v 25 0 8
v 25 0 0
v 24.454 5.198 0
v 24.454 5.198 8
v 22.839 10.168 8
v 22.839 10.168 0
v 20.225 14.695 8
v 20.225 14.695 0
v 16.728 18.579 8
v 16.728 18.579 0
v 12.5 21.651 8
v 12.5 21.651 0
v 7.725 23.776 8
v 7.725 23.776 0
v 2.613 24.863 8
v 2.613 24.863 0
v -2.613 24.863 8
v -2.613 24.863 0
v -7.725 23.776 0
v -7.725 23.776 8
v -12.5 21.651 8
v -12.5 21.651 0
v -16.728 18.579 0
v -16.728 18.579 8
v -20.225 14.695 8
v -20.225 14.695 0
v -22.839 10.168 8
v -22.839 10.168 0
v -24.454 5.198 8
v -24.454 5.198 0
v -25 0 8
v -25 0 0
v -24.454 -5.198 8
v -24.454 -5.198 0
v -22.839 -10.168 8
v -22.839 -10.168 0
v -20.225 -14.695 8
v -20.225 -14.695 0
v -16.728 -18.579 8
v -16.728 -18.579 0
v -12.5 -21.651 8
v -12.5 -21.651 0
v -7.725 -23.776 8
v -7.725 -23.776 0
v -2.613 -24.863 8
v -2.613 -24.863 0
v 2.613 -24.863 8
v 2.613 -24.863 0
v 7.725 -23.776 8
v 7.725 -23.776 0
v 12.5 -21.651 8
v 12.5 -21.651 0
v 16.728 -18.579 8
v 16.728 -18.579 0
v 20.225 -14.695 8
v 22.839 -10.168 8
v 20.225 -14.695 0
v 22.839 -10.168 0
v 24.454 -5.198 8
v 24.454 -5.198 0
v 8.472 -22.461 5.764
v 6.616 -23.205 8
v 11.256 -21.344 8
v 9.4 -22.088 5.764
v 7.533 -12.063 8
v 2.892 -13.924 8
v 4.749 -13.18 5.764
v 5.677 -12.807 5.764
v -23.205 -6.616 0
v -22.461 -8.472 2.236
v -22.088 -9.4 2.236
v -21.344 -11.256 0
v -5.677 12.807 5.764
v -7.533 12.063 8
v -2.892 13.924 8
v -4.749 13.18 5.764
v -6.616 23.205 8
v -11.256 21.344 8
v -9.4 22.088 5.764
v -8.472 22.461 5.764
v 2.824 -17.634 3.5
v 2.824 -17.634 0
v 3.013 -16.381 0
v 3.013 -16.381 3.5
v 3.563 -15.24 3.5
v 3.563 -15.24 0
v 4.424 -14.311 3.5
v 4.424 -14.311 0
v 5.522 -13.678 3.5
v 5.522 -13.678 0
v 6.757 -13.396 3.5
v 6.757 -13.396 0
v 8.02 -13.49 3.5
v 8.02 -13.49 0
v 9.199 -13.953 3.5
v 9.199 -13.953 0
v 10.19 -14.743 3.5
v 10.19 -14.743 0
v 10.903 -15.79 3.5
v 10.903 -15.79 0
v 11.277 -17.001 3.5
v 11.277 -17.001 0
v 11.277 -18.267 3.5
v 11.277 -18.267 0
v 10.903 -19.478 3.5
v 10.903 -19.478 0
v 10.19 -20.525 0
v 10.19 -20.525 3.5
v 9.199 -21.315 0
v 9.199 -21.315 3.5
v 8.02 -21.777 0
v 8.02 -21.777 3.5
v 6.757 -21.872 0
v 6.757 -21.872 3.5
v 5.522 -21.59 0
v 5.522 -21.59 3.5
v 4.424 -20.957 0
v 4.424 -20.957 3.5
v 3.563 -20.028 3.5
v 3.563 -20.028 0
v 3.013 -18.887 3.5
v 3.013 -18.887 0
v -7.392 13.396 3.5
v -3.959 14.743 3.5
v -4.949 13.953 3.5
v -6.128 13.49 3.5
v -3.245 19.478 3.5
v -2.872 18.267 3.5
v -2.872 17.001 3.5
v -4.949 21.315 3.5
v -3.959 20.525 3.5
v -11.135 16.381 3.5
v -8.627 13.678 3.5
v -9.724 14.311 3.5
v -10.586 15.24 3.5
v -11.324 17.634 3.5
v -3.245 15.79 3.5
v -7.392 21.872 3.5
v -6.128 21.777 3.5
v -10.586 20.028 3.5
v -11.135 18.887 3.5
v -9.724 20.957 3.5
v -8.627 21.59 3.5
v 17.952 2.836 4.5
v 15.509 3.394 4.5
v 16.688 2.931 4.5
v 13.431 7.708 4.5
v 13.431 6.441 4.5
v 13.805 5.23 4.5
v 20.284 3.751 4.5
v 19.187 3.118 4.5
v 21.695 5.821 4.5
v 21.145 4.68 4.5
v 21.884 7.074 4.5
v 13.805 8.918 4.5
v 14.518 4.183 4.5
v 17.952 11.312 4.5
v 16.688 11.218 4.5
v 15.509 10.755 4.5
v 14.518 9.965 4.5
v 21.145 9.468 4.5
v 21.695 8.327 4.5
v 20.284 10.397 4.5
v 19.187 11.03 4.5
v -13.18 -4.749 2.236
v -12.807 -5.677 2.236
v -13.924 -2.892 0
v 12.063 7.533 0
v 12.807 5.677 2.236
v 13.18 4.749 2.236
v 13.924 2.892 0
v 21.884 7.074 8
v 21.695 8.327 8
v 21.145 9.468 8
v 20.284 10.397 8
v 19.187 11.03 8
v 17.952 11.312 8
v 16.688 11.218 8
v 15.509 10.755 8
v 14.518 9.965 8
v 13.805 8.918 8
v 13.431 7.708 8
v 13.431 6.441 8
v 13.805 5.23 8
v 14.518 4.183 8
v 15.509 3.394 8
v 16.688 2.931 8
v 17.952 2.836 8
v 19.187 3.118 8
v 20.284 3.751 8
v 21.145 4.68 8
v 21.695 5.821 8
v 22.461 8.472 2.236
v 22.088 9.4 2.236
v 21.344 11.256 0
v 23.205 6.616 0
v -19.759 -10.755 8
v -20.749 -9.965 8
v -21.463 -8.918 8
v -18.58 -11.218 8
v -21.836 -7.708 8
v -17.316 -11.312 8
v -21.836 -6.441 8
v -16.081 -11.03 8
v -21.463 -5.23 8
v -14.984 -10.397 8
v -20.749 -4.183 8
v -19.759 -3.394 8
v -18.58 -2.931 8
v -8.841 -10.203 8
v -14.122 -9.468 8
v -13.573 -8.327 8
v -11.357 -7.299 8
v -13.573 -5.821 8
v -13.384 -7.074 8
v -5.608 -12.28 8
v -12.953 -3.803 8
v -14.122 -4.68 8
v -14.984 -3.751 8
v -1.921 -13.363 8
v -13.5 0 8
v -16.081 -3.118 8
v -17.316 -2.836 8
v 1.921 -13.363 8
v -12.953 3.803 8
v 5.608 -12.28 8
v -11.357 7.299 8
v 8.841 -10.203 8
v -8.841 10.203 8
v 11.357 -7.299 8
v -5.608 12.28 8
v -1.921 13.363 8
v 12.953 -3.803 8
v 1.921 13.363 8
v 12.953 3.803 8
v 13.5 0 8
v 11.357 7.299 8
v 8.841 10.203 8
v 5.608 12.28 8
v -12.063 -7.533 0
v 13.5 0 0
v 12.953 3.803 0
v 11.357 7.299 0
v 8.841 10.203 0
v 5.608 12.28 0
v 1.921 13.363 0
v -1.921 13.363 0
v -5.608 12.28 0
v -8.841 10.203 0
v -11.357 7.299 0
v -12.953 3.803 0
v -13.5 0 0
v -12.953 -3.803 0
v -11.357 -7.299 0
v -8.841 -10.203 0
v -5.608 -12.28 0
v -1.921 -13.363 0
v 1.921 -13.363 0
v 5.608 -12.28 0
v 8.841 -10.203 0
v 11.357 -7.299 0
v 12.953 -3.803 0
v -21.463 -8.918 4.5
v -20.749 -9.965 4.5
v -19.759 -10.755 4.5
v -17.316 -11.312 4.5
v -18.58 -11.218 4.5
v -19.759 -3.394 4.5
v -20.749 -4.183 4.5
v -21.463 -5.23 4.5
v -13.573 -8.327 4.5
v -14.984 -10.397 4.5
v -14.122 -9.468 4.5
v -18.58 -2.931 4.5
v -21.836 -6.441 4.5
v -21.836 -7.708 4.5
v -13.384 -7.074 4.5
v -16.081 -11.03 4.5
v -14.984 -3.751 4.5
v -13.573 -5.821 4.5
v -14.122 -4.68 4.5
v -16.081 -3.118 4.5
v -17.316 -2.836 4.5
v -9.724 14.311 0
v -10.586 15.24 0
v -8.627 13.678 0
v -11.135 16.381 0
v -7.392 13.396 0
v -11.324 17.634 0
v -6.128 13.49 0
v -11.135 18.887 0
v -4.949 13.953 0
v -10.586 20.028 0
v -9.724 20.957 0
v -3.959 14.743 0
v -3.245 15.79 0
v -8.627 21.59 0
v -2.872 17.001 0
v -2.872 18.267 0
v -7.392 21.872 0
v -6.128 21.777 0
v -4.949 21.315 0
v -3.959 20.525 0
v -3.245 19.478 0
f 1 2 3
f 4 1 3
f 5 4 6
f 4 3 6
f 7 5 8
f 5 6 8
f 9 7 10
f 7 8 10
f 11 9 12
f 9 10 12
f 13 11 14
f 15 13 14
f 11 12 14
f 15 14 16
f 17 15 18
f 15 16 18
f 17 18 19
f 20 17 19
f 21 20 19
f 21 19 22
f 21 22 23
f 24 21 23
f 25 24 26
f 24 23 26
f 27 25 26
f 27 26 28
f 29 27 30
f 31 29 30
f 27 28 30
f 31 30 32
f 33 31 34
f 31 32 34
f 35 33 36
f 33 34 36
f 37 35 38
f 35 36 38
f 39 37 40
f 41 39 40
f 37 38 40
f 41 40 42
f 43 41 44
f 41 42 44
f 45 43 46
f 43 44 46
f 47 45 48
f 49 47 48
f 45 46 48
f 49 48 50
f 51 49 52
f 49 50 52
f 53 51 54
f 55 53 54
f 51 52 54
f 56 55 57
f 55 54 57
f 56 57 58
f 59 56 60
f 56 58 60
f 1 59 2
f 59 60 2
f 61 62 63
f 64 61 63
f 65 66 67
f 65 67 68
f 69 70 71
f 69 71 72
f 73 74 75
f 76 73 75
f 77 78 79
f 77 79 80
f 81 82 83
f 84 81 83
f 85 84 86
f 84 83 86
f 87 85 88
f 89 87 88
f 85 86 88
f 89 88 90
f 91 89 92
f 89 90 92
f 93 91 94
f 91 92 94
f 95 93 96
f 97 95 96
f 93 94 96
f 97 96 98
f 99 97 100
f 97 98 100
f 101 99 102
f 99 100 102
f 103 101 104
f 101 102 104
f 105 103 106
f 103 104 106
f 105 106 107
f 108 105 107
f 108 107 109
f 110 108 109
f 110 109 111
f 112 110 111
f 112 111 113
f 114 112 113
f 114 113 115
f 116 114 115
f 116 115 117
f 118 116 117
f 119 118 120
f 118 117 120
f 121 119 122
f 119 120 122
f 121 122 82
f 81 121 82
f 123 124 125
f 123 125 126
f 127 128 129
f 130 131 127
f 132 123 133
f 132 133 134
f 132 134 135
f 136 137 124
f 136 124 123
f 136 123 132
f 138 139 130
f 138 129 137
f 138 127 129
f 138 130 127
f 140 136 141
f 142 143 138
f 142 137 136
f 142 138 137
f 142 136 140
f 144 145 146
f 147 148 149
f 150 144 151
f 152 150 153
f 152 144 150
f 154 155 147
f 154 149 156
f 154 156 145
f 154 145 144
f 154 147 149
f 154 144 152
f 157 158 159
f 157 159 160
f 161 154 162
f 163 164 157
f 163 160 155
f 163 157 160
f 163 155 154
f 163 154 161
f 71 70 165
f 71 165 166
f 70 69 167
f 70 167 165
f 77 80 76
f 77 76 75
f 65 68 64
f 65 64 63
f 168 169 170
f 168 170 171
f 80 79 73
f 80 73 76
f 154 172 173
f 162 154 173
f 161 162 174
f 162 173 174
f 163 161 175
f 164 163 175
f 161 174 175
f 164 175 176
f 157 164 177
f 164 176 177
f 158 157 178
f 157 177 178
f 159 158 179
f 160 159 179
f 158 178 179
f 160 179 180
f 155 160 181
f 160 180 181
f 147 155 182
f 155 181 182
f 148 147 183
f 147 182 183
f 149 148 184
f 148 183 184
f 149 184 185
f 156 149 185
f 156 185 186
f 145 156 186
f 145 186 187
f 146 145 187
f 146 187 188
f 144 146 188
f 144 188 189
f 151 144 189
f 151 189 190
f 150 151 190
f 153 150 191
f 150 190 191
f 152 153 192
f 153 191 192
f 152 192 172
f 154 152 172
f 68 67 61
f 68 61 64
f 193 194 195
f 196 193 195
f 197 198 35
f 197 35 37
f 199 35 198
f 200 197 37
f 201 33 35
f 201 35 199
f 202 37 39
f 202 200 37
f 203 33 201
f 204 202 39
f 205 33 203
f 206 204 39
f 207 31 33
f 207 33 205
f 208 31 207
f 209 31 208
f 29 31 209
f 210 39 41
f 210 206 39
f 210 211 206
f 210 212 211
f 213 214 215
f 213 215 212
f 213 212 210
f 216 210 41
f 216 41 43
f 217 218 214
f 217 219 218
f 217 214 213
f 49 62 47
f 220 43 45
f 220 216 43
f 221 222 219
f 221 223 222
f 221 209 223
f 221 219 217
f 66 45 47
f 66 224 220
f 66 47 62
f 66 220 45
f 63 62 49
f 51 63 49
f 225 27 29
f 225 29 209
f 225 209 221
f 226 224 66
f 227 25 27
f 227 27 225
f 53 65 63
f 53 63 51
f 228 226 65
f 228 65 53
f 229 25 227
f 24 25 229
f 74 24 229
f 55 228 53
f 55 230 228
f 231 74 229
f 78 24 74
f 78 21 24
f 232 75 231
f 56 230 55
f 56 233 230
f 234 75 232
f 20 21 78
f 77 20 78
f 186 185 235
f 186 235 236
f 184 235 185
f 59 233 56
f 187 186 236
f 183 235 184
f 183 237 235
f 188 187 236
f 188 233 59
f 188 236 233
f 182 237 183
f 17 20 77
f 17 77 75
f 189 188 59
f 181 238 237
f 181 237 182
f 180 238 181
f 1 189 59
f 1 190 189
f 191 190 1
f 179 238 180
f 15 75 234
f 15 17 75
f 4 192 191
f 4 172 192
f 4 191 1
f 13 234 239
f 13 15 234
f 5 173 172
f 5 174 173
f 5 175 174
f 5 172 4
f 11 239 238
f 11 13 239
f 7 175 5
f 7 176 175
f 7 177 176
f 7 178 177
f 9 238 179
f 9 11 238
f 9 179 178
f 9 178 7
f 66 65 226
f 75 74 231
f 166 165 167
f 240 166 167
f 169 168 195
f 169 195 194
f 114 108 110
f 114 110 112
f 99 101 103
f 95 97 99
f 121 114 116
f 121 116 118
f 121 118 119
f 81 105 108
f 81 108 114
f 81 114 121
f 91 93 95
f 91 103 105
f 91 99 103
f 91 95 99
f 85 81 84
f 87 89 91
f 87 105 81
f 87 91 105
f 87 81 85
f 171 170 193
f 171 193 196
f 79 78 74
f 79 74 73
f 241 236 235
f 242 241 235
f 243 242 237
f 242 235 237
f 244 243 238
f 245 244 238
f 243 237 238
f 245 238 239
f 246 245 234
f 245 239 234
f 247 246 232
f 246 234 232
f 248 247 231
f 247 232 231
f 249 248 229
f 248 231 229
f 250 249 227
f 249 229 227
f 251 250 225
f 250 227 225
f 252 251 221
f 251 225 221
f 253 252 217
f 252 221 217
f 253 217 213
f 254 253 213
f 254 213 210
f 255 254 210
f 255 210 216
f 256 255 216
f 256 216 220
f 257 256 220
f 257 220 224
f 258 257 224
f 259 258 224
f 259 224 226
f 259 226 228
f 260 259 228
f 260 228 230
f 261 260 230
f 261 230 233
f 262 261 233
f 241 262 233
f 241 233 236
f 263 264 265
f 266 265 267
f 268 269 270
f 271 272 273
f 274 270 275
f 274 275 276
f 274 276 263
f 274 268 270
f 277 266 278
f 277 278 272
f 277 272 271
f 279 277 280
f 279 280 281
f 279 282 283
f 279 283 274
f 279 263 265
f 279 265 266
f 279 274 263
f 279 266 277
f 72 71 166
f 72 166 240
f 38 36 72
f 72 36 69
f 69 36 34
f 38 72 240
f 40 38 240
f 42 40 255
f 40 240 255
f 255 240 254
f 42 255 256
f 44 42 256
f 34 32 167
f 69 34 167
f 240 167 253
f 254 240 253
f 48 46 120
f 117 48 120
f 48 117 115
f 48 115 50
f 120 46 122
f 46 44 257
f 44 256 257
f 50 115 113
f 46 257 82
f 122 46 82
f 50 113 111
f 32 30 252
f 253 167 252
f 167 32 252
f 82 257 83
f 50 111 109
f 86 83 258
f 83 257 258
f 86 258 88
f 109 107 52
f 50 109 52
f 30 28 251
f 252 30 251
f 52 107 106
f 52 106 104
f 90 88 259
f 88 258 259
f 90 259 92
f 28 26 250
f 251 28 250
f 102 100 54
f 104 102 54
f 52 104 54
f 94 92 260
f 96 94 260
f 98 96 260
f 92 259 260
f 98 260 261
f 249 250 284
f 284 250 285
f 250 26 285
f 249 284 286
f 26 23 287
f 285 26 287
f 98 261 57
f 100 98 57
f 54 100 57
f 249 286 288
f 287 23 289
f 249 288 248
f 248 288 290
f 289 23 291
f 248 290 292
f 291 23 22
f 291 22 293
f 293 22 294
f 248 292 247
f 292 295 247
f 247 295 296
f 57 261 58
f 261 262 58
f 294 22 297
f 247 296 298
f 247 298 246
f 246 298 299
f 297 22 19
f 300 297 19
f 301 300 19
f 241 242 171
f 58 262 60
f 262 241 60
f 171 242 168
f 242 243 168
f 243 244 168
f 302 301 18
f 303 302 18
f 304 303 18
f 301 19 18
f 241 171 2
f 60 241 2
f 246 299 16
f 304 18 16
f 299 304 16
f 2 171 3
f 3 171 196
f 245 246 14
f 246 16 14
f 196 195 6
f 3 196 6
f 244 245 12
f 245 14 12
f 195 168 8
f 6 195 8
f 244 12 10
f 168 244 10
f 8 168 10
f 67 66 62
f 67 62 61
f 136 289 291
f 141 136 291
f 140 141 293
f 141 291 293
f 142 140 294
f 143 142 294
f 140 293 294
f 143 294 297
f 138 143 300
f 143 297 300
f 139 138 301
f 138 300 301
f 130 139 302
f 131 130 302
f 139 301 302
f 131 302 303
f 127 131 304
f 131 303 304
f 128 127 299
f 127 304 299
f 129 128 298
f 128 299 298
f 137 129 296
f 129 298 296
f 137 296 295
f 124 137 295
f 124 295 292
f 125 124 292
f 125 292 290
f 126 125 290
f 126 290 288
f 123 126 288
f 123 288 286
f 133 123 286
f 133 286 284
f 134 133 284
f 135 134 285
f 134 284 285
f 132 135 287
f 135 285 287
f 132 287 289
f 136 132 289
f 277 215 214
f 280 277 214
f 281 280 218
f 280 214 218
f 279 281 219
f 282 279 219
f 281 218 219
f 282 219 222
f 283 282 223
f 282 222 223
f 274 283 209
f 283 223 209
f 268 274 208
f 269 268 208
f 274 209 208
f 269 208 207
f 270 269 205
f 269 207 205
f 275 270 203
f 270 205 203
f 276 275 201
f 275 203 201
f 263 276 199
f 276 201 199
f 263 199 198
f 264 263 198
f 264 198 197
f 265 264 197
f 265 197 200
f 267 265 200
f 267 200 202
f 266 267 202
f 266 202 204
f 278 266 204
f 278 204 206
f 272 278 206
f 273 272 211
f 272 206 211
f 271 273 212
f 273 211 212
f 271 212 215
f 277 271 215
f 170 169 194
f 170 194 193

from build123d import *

# Parameters (mm, degrees)
ESQUISSE1_R              = 25
ESQUISSE1_R_2            = 11
BOSS_EXTRU_1_DEPTH       = 8
ENL_V_START              = -14
ENL_V_MAT_EXTRU_9_DEPTH  = 10
ESQUISSE10_R             = 4.25
ENL_V_MAT_EXTRU_5_DEPTH  = 3.5
ESQUISSE12_R             = 4.25
ENL_V_MAT_EXTRU_6_DEPTH  = 3.5
ESQUISSE13_R             = 13.5
ENL_V_MAT_EXTRU_7_DEPTH  = 10
ENL_V_MAT_EXTRU_10_DEPTH = 10


with BuildPart() as part:
    # Esquisse1 → Boss.-Extru.1 (new body)
    with BuildSketch(Plane.XY):
        Circle(ESQUISSE1_R)
        Circle(ESQUISSE1_R_2, mode=Mode.SUBTRACT)
    extrude(amount=BOSS_EXTRU_1_DEPTH)

    # Esquisse16 → Enlèv. mat.-Extru.9 (cut)
    with BuildSketch(Plane(origin=(0, 0, 0), x_dir=(-0.9281017411356184, -0.3723266819622707, 0), z_dir=(-0.3723266819622707, 0.9281017411356184, 0)).offset(ENL_V_START)):
        Polygon((-2.5, 8), (2.5, 8), (0.5, 5.763932023), (-0.5, 5.763932023), align=None)
    enl_v_mat_extru_9 = extrude(amount=-ENL_V_MAT_EXTRU_9_DEPTH, mode=Mode.SUBTRACT)

    # Symétrie4: Enlèv. mat.-Extru.9 across plane
    add(enl_v_mat_extru_9.mirror(Plane(origin=(0, 0, 0), x_dir=(0, 0, 1), z_dir=(-0.3723266819622707, 0.9281017411356184, 0))), mode=Mode.SUBTRACT)

    # Esquisse10 → Enlèv. mat.-Extru.5 (cut)
    with BuildSketch(Plane(origin=(0, 0, 0), x_dir=(-1, 0, 0), z_dir=(0, 0, -1))):
        with Locations((7.074206957, 17.633933082)):
            Circle(ESQUISSE10_R)
        with Locations((-7.074206957, -17.633933082)):
            Circle(ESQUISSE10_R)
    extrude(amount=-ENL_V_MAT_EXTRU_5_DEPTH, mode=Mode.SUBTRACT)

    # Esquisse12 → Enlèv. mat.-Extru.6 (cut)
    with BuildSketch(Plane.XY.offset(8)):
        with Locations((17.633933082, 7.074206957)):
            Circle(ESQUISSE12_R)
        with Locations((-17.633933082, -7.074206957)):
            Circle(ESQUISSE12_R)
    extrude(amount=-ENL_V_MAT_EXTRU_6_DEPTH, mode=Mode.SUBTRACT)

    # Esquisse13 → Enlèv. mat.-Extru.7 (cut)
    with BuildSketch(Plane.XY.offset(8)):
        Circle(ESQUISSE13_R)
    extrude(amount=-ENL_V_MAT_EXTRU_7_DEPTH, mode=Mode.SUBTRACT)

    # Esquisse18 → Enlèv. mat.-Extru.10 (cut)
    with BuildSketch(Plane(origin=(0, 0, 8), x_dir=(0, 0, 1), z_dir=(-0.9281017411356183, -0.37232668196227087, 0)).offset(ENL_V_START)):
        Polygon((-8, -2.5), (-8, 2.5), (-5.763932023, 0.5), (-5.763932023, -0.5), align=None)
    enl_v_mat_extru_10 = extrude(amount=-ENL_V_MAT_EXTRU_10_DEPTH, mode=Mode.SUBTRACT)

    # Symétrie5: Enlèv. mat.-Extru.10 across plane
    add(enl_v_mat_extru_10.mirror(Plane(origin=(0, 0, 8), x_dir=(0, 0, 1), z_dir=(-0.9281017411356183, -0.37232668196227087, 0))), mode=Mode.SUBTRACT)


solid = part.part
